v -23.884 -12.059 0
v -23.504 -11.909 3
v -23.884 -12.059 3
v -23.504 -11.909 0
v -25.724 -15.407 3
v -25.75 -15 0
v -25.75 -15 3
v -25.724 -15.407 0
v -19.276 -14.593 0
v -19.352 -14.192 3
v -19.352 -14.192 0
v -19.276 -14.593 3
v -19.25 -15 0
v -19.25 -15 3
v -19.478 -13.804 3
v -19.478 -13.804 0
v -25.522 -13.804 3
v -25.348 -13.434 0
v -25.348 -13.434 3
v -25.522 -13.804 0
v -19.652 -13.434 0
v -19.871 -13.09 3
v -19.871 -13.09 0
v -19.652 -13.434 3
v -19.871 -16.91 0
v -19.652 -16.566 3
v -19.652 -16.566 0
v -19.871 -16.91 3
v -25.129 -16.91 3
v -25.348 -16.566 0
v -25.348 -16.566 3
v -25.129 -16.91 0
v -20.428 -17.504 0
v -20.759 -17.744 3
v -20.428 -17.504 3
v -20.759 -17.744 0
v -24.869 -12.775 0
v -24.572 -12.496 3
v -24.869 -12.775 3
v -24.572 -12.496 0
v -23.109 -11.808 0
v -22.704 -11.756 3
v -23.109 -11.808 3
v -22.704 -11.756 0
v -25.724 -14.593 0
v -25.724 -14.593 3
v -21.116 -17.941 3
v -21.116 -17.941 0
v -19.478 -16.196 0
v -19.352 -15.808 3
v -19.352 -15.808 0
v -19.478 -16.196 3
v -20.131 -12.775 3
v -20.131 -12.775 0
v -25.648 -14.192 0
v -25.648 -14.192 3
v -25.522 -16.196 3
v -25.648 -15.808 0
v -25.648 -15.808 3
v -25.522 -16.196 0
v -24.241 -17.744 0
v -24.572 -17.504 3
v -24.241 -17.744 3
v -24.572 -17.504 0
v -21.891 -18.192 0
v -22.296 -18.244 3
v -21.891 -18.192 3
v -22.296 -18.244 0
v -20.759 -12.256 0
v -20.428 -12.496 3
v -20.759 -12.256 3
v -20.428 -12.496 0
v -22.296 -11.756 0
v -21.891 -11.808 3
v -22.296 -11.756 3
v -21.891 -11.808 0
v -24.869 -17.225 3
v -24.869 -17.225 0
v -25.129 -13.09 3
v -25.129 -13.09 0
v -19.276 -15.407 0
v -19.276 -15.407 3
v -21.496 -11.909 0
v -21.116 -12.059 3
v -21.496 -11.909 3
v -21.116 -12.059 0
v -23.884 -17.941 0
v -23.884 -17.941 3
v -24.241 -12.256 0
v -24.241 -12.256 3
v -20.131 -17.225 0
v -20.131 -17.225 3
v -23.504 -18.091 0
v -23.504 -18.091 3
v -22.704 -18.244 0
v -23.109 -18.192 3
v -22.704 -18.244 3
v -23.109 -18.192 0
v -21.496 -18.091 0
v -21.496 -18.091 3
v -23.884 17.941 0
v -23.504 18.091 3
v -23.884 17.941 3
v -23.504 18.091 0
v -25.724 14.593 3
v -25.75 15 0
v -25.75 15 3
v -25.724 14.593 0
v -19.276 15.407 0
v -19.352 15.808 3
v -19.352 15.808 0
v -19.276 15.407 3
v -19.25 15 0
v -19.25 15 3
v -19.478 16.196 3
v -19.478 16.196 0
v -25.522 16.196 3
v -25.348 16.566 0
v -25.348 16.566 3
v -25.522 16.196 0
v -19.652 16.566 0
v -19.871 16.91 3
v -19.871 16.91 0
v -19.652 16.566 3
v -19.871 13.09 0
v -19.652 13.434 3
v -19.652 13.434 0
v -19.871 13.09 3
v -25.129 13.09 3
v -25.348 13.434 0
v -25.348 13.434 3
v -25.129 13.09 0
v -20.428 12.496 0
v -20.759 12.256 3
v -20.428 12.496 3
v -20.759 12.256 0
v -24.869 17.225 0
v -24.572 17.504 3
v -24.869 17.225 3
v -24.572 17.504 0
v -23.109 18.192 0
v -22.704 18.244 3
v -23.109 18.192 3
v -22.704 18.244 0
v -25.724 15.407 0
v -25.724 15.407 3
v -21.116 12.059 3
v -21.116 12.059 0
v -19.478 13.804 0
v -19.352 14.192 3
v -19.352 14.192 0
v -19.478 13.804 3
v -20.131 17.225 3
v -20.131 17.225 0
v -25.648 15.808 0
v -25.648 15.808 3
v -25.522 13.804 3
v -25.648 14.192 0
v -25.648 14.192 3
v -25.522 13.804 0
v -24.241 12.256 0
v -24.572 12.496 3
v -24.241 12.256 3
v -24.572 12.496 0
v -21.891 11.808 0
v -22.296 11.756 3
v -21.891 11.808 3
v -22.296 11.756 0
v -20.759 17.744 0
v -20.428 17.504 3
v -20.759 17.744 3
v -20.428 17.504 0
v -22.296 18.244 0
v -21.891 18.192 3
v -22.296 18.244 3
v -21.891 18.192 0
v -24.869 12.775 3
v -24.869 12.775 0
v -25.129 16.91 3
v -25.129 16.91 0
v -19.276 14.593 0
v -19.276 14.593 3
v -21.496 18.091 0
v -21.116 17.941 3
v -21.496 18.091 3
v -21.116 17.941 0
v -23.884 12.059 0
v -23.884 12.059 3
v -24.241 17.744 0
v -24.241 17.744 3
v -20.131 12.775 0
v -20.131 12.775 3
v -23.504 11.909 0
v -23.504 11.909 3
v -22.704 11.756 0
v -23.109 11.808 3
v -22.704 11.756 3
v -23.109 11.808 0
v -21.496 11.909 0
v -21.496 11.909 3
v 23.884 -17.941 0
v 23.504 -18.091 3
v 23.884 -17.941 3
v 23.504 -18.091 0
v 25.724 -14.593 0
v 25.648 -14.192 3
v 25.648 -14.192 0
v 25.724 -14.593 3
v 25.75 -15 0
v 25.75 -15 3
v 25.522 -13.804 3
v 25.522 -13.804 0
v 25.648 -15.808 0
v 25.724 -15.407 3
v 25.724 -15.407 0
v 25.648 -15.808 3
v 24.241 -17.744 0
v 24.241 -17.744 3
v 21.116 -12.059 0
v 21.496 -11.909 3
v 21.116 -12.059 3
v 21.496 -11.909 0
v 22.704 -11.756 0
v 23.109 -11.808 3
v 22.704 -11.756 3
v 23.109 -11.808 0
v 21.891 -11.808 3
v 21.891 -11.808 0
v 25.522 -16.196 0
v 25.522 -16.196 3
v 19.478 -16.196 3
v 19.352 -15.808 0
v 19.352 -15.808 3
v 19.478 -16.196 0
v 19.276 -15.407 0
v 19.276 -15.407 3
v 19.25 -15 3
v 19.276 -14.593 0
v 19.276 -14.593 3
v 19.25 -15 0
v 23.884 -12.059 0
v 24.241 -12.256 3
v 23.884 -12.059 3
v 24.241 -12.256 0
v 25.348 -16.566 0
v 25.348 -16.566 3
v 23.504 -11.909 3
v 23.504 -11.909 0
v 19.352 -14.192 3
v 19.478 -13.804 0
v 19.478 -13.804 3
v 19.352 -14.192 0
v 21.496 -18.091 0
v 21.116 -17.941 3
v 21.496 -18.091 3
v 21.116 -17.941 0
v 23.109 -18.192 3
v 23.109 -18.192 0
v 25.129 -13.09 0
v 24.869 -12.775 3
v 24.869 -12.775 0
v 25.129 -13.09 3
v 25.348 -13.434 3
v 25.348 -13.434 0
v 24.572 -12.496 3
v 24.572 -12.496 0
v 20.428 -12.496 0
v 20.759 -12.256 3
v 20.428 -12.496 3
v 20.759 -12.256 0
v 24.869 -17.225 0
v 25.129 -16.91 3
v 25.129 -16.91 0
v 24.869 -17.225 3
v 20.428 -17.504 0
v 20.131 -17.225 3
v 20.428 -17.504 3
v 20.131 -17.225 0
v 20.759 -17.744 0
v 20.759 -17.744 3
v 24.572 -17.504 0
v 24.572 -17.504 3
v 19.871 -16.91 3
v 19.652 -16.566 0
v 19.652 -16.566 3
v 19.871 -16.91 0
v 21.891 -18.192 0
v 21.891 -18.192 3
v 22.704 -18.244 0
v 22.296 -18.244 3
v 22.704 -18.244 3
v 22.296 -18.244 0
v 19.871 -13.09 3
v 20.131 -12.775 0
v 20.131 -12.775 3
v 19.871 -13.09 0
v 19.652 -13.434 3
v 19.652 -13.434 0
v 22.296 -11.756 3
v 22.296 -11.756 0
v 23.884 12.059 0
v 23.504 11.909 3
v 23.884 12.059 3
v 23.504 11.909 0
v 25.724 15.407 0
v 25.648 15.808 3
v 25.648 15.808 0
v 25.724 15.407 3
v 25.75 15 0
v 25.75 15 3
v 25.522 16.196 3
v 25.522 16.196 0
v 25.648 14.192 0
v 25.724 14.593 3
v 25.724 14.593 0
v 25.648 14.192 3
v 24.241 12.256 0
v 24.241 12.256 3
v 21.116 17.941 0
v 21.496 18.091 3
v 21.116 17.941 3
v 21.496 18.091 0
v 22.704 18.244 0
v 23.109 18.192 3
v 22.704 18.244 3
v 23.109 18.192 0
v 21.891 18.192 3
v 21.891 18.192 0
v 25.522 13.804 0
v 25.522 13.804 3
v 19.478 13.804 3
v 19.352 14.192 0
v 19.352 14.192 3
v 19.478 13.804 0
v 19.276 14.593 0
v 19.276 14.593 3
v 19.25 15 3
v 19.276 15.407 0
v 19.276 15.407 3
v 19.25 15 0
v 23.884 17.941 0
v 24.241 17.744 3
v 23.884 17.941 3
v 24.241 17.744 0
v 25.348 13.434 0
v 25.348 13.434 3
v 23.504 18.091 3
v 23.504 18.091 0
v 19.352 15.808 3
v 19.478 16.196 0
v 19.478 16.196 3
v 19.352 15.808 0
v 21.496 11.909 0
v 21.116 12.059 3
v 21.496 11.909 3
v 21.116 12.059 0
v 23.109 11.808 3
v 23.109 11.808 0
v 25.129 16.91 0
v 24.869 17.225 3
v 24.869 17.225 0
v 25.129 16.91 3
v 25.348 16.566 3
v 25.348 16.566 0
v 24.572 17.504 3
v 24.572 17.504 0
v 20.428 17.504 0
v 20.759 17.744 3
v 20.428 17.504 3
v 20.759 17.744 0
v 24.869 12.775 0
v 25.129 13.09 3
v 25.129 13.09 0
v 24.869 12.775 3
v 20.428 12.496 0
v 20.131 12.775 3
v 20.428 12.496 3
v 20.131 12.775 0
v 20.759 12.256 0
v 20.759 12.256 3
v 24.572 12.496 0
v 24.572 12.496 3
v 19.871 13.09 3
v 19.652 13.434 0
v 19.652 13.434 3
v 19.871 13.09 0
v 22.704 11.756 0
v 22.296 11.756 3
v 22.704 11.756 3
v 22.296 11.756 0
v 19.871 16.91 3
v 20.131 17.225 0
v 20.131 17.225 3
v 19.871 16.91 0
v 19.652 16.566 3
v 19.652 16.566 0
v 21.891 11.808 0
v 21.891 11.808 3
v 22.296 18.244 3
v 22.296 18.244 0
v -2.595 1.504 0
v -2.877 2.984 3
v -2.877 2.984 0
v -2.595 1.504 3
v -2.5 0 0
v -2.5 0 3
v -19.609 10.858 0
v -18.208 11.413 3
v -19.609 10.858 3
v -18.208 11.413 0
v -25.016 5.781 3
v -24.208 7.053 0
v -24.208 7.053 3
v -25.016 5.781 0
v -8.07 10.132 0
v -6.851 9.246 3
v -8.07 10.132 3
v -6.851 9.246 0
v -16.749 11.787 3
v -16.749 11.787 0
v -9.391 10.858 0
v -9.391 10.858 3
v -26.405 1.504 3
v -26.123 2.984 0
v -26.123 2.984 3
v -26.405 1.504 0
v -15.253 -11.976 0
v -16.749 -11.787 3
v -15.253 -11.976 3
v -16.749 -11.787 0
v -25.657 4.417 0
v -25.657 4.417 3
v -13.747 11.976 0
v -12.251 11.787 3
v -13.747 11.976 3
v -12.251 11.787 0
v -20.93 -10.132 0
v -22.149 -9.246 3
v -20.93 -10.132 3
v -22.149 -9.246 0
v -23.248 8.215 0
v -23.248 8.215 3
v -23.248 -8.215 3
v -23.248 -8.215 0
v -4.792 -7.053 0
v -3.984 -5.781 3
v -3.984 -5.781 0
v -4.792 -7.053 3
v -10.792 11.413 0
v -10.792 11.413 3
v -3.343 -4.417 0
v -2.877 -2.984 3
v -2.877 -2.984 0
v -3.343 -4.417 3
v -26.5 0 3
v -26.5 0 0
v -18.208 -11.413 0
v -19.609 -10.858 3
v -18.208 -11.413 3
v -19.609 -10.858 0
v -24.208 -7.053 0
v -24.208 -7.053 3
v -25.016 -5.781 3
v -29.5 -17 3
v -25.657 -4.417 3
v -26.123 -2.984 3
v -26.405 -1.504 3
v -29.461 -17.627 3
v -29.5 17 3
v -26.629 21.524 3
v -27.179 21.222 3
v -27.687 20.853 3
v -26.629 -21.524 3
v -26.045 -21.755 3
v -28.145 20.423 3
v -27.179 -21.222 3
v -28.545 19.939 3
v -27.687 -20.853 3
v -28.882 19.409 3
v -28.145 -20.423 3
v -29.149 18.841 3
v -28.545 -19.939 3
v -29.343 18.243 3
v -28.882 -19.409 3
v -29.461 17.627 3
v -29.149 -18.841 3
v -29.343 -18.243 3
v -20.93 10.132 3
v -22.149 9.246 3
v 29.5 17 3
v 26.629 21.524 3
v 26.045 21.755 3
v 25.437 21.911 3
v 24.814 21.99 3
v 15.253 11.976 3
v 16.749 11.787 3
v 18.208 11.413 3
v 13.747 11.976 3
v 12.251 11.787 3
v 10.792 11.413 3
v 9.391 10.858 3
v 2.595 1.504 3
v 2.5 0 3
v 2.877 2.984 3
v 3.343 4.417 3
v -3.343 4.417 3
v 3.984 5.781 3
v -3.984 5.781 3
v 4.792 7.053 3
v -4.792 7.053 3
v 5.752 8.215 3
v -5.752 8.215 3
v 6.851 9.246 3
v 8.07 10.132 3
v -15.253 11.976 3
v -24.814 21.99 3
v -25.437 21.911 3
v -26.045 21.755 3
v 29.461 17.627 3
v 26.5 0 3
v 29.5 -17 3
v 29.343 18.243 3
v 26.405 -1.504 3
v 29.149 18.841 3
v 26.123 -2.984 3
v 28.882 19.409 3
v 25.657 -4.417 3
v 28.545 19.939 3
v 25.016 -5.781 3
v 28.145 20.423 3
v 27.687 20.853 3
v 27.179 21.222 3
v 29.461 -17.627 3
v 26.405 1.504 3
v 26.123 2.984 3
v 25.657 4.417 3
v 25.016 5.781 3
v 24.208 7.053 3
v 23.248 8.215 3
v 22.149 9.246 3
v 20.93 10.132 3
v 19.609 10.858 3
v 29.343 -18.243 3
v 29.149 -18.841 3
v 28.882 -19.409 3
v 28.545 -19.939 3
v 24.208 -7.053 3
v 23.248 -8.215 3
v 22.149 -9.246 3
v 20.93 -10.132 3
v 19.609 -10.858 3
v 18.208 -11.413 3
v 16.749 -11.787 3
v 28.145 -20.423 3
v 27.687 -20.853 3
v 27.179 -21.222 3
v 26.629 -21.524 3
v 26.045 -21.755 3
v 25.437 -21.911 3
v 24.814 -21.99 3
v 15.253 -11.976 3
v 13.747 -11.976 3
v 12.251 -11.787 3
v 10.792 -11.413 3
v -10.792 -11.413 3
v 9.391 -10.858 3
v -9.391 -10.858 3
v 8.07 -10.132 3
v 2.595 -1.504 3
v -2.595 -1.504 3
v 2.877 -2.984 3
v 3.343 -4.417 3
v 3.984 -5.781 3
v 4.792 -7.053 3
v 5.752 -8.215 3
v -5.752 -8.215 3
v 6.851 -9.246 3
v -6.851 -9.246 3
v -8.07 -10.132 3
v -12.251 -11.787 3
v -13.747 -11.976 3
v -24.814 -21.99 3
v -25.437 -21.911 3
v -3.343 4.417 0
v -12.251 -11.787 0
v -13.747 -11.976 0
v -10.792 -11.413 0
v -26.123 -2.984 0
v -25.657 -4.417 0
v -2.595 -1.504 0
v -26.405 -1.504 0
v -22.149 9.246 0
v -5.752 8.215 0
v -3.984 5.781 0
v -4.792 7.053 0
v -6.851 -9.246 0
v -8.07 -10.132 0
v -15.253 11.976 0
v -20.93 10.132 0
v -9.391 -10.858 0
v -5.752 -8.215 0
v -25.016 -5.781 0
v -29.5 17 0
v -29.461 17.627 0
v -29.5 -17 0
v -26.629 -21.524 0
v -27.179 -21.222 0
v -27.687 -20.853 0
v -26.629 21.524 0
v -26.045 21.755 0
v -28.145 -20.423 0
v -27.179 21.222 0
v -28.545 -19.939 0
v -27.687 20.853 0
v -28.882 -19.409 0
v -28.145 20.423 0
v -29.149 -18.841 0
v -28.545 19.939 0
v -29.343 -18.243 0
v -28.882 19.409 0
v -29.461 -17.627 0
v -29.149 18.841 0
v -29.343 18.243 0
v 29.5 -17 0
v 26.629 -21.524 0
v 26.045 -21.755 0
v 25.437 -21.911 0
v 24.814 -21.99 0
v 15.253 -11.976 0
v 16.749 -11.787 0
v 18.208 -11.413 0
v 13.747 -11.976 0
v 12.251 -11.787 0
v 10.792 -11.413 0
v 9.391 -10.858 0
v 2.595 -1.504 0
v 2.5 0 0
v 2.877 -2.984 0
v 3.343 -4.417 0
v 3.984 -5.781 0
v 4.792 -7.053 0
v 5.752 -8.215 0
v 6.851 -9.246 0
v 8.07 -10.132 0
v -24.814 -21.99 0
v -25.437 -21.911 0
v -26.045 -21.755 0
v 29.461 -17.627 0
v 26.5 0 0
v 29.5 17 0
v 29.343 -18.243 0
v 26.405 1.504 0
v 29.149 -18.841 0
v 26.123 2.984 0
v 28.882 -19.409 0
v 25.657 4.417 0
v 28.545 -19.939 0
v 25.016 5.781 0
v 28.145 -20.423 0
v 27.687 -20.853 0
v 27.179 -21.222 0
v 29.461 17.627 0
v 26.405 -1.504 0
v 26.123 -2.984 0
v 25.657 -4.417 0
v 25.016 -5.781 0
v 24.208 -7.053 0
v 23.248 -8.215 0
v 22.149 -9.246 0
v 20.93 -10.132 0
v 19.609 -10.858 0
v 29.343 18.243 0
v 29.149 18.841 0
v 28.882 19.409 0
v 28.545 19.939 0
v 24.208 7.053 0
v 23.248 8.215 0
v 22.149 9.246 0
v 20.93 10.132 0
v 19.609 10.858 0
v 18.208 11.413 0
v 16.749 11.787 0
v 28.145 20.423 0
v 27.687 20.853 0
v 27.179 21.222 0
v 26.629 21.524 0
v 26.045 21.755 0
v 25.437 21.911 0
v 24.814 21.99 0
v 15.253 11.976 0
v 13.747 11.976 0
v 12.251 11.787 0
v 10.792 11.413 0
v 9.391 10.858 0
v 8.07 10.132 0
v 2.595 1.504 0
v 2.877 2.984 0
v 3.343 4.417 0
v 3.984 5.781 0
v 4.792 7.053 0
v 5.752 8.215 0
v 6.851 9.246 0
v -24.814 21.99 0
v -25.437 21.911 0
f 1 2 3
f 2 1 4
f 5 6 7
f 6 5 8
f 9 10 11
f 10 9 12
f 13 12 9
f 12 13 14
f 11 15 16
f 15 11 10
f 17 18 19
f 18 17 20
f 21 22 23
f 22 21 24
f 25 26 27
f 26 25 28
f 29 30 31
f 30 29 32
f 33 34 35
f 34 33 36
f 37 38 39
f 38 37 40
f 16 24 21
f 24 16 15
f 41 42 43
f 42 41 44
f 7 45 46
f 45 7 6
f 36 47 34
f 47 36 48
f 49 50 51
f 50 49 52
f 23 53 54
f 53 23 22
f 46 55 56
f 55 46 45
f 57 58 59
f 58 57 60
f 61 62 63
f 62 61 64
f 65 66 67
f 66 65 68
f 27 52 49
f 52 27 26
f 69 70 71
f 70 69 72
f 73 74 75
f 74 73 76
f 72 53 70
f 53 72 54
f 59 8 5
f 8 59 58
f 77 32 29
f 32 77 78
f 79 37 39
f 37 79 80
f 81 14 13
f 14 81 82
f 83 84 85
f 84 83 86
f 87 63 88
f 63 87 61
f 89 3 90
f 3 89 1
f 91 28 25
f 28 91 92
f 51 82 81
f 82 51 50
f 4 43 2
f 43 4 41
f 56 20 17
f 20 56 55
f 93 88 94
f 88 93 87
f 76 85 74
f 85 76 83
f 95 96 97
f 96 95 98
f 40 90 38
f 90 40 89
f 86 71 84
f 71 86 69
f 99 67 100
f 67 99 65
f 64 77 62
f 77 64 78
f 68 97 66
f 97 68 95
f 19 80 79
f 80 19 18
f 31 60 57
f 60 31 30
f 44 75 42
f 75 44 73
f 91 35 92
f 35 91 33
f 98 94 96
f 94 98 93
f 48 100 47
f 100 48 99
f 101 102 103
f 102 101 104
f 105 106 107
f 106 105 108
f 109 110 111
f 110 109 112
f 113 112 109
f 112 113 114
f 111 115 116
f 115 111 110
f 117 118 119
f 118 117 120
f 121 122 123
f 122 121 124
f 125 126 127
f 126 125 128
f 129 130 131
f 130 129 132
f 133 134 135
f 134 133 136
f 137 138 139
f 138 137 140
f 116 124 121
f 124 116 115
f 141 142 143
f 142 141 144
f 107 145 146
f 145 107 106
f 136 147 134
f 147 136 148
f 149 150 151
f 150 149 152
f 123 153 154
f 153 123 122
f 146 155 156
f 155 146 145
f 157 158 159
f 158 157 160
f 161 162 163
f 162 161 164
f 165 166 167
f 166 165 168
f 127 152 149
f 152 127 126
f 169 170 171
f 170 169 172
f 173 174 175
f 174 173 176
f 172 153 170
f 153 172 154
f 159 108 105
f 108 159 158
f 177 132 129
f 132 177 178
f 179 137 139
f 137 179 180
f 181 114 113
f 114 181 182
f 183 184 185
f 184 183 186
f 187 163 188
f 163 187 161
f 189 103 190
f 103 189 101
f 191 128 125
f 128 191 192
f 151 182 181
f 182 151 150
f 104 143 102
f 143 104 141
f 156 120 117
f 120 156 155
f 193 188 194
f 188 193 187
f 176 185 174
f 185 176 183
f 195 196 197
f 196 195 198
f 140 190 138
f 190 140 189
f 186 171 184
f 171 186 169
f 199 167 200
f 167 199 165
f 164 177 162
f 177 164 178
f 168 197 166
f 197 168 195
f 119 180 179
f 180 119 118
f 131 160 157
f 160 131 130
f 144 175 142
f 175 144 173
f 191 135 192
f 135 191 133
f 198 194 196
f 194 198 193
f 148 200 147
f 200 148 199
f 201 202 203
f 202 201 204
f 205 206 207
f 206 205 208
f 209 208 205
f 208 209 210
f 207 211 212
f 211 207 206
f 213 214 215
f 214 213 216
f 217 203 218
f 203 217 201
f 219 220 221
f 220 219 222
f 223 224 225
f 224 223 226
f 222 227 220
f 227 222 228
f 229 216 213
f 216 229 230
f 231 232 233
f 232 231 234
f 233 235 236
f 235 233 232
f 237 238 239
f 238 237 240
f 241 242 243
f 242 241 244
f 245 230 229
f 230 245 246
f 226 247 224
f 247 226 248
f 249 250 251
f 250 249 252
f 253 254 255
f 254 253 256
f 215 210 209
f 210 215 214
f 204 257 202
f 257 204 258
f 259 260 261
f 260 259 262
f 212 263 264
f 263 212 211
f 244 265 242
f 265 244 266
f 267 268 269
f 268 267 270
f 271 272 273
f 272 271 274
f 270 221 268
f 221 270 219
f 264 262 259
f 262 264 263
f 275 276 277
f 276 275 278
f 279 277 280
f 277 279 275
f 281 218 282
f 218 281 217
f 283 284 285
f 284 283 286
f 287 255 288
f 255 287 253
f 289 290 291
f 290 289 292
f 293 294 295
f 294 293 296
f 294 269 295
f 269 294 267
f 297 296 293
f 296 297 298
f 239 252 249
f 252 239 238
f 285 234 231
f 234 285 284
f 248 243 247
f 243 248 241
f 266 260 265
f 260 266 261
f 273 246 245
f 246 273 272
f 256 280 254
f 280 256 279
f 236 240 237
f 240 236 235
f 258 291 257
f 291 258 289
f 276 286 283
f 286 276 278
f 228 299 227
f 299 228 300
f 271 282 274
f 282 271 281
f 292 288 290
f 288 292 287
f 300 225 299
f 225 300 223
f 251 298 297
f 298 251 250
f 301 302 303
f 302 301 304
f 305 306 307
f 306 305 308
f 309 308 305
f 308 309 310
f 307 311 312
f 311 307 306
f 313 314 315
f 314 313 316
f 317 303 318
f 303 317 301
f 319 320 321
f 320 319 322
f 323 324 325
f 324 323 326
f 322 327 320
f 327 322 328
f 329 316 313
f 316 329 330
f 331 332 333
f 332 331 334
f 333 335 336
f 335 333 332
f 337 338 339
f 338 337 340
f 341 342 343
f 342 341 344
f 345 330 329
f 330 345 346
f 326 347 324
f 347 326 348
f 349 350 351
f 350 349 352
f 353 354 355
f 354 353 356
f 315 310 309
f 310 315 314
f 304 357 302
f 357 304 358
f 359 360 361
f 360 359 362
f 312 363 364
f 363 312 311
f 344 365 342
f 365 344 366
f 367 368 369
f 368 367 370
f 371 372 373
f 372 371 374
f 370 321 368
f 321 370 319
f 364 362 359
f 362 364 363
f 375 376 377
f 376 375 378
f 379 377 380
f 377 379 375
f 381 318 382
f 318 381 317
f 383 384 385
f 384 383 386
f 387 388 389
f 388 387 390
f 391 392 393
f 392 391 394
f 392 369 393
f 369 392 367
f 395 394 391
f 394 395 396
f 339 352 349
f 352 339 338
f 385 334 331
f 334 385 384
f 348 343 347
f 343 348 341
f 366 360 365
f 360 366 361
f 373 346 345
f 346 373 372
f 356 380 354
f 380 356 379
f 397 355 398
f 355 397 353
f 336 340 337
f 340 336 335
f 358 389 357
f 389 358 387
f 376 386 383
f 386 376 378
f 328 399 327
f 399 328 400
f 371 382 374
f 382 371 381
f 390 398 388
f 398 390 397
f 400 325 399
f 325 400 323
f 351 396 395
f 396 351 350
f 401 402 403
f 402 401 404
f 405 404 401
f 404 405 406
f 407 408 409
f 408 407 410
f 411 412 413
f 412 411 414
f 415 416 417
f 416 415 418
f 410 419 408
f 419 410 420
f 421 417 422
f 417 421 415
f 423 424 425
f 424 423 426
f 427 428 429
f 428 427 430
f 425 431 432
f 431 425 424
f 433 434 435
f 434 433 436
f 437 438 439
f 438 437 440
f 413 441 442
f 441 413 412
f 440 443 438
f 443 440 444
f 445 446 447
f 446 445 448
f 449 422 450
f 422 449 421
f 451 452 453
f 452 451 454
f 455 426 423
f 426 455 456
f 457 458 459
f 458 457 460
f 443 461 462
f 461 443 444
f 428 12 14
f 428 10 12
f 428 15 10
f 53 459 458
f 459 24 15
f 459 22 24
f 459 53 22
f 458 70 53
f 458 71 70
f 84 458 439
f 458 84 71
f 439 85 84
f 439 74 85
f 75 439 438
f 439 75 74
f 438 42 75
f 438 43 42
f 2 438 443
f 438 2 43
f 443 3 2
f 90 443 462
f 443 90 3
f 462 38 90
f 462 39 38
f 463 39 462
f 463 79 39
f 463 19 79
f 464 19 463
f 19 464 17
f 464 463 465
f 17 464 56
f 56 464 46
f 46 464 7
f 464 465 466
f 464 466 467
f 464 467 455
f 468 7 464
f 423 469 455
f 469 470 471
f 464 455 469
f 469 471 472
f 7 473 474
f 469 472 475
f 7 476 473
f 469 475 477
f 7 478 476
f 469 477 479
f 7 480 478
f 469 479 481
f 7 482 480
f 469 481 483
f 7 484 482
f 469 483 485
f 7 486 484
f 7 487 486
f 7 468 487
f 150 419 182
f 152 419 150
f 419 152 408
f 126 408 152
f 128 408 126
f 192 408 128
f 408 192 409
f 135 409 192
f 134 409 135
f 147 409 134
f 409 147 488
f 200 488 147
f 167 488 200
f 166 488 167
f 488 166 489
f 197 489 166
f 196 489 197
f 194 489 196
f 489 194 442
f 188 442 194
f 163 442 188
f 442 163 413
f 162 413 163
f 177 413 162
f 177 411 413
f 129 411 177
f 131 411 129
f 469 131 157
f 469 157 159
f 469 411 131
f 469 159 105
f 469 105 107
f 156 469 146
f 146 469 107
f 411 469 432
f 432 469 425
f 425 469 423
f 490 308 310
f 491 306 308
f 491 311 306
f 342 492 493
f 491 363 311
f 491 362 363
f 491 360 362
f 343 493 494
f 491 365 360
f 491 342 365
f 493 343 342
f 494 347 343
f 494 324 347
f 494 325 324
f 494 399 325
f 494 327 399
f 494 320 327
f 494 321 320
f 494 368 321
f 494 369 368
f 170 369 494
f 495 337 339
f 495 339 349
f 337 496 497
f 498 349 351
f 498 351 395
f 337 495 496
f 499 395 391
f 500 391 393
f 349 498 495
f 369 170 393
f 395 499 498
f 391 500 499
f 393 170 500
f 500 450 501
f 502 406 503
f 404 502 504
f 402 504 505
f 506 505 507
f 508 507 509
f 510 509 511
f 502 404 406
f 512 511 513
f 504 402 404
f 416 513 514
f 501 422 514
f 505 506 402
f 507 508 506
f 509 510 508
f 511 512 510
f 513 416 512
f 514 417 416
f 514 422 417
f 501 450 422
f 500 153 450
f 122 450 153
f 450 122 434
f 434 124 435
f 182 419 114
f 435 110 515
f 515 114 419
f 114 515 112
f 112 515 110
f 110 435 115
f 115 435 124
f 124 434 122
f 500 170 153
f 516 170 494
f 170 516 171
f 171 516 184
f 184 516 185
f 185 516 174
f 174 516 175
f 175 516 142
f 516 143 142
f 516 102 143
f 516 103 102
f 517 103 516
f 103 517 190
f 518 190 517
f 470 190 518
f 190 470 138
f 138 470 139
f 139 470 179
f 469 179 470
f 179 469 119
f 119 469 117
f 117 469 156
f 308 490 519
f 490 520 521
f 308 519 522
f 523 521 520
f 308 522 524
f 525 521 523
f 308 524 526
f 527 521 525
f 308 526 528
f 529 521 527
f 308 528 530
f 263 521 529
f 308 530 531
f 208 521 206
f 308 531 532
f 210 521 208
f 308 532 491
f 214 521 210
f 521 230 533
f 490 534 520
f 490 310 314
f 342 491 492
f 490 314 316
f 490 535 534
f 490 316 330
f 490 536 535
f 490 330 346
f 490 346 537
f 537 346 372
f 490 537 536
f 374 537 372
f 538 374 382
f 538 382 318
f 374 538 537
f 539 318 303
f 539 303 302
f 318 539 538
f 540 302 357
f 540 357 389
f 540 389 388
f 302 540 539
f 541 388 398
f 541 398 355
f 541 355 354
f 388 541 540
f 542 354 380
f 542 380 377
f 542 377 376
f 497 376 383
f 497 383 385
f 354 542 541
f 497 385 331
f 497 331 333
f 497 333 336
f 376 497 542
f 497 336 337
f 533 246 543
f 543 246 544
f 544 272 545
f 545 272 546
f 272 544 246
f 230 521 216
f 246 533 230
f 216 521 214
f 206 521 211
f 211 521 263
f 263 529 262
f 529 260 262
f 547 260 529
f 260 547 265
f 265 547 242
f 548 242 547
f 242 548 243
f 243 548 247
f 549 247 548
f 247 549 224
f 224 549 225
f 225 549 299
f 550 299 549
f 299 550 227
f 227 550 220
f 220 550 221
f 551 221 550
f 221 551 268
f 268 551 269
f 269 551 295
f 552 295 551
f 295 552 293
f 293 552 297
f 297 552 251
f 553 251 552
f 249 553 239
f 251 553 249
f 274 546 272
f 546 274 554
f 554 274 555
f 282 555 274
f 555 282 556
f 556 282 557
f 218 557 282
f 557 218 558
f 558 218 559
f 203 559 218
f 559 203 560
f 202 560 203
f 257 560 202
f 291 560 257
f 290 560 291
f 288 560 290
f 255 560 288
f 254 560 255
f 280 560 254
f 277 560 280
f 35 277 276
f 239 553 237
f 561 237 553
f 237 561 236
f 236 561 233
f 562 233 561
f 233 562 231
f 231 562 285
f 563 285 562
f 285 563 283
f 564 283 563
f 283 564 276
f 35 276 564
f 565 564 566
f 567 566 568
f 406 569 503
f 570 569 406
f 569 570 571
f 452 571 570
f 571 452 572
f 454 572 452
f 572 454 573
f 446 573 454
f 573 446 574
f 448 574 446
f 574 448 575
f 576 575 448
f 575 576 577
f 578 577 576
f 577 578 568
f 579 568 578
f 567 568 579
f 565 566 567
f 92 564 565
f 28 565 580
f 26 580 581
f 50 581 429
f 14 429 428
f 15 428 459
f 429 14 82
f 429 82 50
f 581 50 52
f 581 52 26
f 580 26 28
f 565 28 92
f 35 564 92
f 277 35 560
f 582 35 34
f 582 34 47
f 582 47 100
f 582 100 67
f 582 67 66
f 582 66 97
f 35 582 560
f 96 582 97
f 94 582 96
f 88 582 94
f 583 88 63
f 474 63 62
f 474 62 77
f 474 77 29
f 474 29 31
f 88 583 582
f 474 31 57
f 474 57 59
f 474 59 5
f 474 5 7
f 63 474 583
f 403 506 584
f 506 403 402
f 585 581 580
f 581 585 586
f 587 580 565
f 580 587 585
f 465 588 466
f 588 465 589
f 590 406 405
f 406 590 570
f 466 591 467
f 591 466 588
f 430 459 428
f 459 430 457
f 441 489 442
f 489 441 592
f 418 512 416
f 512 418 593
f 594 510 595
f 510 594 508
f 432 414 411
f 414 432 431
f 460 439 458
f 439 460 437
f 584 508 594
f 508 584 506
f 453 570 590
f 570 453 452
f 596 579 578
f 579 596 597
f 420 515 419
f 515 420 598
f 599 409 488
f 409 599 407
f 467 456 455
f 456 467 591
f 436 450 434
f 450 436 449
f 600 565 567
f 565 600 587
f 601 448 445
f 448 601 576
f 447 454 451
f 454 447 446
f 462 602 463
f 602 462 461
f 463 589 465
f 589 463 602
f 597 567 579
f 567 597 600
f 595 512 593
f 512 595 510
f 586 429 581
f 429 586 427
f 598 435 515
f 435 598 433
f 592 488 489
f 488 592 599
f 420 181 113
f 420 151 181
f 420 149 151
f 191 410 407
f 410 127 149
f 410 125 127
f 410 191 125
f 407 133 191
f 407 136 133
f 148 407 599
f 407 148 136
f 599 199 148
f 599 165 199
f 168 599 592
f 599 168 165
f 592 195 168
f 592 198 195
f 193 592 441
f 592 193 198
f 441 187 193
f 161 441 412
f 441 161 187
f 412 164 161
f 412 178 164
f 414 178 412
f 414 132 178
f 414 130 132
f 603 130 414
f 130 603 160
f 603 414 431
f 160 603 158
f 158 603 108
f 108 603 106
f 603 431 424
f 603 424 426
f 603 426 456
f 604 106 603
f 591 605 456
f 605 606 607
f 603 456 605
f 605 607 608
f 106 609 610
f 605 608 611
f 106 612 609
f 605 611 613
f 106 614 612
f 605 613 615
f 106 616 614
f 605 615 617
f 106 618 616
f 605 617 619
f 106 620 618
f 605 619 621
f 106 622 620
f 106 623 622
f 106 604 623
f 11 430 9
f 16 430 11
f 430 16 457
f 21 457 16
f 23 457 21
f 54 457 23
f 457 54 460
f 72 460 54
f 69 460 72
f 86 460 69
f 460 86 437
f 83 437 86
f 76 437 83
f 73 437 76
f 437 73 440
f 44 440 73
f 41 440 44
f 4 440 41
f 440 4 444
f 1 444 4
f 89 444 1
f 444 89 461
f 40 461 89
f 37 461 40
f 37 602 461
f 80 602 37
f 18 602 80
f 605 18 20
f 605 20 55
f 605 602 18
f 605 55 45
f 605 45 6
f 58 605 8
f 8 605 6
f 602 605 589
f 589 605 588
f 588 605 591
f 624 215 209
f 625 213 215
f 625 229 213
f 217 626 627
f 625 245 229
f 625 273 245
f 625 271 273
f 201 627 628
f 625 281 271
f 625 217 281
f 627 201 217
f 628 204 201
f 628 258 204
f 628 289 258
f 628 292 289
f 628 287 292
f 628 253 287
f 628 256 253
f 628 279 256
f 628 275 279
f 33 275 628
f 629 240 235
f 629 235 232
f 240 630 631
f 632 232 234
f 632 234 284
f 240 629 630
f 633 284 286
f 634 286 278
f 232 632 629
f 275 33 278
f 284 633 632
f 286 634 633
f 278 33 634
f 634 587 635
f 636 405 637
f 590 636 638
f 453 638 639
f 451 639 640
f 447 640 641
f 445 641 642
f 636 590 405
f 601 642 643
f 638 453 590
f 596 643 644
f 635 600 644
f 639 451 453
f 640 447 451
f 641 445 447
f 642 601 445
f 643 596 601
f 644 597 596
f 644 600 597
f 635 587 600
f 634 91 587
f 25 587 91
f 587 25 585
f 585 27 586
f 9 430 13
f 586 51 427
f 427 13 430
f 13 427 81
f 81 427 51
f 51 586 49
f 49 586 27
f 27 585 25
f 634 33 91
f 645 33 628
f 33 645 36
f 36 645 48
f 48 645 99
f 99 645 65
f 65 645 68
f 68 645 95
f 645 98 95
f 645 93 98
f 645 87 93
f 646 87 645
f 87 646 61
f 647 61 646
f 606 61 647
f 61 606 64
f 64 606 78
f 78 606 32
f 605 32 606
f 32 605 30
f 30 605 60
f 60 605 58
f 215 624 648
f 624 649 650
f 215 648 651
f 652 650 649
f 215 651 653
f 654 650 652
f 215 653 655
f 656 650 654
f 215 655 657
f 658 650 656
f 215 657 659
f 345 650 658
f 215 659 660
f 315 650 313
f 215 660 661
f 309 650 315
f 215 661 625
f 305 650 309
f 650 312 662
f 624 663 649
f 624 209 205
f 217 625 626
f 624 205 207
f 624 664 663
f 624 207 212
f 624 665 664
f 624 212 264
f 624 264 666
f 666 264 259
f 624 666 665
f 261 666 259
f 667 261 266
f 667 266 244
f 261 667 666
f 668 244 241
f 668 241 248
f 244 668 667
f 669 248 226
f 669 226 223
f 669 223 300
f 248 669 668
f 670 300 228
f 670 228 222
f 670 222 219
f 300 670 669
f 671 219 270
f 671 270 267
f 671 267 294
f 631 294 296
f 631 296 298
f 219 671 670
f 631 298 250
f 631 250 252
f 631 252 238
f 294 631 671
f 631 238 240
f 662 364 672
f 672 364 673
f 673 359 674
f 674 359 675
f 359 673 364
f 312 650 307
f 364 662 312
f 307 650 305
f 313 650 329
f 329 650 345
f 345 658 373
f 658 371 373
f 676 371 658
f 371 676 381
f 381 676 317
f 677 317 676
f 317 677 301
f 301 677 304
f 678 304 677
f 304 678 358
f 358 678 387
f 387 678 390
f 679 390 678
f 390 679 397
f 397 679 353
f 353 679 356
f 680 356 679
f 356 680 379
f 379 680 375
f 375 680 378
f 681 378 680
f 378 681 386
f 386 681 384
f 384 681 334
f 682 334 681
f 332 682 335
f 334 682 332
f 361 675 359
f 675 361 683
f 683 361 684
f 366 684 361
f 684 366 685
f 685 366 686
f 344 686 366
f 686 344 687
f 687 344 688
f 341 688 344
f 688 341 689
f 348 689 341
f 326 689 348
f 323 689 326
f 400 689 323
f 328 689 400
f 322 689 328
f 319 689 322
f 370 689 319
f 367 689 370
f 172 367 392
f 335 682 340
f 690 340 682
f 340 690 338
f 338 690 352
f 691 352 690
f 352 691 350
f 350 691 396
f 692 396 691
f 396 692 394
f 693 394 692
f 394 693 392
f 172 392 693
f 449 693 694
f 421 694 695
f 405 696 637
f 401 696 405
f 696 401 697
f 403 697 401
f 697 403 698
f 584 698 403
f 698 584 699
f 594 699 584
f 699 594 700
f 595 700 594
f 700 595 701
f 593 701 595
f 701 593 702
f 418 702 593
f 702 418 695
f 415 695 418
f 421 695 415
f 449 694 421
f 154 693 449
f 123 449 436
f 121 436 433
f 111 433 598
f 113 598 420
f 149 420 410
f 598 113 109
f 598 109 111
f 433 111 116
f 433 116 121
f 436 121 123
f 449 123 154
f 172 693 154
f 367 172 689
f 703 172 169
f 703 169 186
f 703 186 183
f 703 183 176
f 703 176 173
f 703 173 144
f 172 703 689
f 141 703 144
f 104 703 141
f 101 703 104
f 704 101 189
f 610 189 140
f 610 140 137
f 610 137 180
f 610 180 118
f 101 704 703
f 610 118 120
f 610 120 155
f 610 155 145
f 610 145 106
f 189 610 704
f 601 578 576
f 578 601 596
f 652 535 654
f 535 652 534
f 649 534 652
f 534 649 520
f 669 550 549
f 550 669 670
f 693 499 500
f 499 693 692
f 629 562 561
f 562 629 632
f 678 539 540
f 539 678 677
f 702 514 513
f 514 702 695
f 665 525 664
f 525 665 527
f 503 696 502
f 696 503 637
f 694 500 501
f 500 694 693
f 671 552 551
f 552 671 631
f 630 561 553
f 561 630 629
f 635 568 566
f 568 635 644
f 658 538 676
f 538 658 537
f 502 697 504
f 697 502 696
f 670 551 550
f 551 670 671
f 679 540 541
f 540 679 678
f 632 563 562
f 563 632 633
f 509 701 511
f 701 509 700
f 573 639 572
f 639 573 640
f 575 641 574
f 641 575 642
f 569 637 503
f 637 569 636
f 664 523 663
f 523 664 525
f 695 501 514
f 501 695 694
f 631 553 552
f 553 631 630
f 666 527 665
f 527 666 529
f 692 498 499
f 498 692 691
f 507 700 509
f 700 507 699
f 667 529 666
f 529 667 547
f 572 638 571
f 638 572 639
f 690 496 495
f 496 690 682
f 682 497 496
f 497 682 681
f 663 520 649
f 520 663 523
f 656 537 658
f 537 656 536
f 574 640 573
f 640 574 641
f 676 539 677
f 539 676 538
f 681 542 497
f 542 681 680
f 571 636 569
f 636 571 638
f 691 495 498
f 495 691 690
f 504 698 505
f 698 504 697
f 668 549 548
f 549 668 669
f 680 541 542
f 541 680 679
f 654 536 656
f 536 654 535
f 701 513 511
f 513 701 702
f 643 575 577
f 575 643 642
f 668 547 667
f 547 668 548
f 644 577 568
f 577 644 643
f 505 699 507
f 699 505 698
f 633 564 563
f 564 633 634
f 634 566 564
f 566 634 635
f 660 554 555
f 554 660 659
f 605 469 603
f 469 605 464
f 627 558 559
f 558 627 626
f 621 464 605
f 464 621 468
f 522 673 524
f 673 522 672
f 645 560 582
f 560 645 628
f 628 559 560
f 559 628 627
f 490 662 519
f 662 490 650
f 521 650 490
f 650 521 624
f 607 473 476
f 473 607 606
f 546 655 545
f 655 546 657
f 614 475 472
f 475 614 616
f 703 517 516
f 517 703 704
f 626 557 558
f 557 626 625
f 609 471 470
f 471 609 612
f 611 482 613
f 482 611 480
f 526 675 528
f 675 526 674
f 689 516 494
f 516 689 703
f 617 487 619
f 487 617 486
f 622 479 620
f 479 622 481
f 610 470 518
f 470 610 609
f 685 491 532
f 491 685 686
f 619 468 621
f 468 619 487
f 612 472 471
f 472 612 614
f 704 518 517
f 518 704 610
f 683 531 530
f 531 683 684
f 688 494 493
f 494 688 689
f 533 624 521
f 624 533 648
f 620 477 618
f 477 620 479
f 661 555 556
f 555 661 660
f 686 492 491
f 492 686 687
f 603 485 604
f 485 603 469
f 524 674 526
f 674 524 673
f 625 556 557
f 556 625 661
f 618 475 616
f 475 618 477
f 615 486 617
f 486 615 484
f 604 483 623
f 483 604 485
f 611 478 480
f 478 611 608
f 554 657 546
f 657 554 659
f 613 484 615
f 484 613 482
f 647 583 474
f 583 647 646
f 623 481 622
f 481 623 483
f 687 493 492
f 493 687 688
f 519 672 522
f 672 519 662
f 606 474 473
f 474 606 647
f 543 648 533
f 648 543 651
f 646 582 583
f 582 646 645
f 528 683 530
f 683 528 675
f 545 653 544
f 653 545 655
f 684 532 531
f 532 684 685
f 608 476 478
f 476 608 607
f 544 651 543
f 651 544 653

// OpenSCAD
$fn = 50;


difference() {
	union() {
		hull() {
			translate(v = [-24.5000000000, 17.0000000000, 0]) {
				cylinder(h = 3, r = 5);
			}
			translate(v = [24.5000000000, 17.0000000000, 0]) {
				cylinder(h = 3, r = 5);
			}
			translate(v = [-24.5000000000, -17.0000000000, 0]) {
				cylinder(h = 3, r = 5);
			}
			translate(v = [24.5000000000, -17.0000000000, 0]) {
				cylinder(h = 3, r = 5);
			}
		}
	}
	union() {
		#translate(v = [-22.5000000000, -15.0000000000, -100.0000000000]) {
			cylinder(h = 200, r = 3.2500000000);
		}
		#translate(v = [-22.5000000000, 15.0000000000, -100.0000000000]) {
			cylinder(h = 200, r = 3.2500000000);
		}
		#translate(v = [22.5000000000, -15.0000000000, -100.0000000000]) {
			cylinder(h = 200, r = 3.2500000000);
		}
		#translate(v = [22.5000000000, 15.0000000000, -100.0000000000]) {
			cylinder(h = 200, r = 3.2500000000);
		}
		#translate(v = [-14.5000000000, 0, 0]) {
			cylinder(h = 3, r = 12.0000000000);
		}
		#translate(v = [14.5000000000, 0, 0]) {
			cylinder(h = 3, r = 12.0000000000);
		}
	}
}
